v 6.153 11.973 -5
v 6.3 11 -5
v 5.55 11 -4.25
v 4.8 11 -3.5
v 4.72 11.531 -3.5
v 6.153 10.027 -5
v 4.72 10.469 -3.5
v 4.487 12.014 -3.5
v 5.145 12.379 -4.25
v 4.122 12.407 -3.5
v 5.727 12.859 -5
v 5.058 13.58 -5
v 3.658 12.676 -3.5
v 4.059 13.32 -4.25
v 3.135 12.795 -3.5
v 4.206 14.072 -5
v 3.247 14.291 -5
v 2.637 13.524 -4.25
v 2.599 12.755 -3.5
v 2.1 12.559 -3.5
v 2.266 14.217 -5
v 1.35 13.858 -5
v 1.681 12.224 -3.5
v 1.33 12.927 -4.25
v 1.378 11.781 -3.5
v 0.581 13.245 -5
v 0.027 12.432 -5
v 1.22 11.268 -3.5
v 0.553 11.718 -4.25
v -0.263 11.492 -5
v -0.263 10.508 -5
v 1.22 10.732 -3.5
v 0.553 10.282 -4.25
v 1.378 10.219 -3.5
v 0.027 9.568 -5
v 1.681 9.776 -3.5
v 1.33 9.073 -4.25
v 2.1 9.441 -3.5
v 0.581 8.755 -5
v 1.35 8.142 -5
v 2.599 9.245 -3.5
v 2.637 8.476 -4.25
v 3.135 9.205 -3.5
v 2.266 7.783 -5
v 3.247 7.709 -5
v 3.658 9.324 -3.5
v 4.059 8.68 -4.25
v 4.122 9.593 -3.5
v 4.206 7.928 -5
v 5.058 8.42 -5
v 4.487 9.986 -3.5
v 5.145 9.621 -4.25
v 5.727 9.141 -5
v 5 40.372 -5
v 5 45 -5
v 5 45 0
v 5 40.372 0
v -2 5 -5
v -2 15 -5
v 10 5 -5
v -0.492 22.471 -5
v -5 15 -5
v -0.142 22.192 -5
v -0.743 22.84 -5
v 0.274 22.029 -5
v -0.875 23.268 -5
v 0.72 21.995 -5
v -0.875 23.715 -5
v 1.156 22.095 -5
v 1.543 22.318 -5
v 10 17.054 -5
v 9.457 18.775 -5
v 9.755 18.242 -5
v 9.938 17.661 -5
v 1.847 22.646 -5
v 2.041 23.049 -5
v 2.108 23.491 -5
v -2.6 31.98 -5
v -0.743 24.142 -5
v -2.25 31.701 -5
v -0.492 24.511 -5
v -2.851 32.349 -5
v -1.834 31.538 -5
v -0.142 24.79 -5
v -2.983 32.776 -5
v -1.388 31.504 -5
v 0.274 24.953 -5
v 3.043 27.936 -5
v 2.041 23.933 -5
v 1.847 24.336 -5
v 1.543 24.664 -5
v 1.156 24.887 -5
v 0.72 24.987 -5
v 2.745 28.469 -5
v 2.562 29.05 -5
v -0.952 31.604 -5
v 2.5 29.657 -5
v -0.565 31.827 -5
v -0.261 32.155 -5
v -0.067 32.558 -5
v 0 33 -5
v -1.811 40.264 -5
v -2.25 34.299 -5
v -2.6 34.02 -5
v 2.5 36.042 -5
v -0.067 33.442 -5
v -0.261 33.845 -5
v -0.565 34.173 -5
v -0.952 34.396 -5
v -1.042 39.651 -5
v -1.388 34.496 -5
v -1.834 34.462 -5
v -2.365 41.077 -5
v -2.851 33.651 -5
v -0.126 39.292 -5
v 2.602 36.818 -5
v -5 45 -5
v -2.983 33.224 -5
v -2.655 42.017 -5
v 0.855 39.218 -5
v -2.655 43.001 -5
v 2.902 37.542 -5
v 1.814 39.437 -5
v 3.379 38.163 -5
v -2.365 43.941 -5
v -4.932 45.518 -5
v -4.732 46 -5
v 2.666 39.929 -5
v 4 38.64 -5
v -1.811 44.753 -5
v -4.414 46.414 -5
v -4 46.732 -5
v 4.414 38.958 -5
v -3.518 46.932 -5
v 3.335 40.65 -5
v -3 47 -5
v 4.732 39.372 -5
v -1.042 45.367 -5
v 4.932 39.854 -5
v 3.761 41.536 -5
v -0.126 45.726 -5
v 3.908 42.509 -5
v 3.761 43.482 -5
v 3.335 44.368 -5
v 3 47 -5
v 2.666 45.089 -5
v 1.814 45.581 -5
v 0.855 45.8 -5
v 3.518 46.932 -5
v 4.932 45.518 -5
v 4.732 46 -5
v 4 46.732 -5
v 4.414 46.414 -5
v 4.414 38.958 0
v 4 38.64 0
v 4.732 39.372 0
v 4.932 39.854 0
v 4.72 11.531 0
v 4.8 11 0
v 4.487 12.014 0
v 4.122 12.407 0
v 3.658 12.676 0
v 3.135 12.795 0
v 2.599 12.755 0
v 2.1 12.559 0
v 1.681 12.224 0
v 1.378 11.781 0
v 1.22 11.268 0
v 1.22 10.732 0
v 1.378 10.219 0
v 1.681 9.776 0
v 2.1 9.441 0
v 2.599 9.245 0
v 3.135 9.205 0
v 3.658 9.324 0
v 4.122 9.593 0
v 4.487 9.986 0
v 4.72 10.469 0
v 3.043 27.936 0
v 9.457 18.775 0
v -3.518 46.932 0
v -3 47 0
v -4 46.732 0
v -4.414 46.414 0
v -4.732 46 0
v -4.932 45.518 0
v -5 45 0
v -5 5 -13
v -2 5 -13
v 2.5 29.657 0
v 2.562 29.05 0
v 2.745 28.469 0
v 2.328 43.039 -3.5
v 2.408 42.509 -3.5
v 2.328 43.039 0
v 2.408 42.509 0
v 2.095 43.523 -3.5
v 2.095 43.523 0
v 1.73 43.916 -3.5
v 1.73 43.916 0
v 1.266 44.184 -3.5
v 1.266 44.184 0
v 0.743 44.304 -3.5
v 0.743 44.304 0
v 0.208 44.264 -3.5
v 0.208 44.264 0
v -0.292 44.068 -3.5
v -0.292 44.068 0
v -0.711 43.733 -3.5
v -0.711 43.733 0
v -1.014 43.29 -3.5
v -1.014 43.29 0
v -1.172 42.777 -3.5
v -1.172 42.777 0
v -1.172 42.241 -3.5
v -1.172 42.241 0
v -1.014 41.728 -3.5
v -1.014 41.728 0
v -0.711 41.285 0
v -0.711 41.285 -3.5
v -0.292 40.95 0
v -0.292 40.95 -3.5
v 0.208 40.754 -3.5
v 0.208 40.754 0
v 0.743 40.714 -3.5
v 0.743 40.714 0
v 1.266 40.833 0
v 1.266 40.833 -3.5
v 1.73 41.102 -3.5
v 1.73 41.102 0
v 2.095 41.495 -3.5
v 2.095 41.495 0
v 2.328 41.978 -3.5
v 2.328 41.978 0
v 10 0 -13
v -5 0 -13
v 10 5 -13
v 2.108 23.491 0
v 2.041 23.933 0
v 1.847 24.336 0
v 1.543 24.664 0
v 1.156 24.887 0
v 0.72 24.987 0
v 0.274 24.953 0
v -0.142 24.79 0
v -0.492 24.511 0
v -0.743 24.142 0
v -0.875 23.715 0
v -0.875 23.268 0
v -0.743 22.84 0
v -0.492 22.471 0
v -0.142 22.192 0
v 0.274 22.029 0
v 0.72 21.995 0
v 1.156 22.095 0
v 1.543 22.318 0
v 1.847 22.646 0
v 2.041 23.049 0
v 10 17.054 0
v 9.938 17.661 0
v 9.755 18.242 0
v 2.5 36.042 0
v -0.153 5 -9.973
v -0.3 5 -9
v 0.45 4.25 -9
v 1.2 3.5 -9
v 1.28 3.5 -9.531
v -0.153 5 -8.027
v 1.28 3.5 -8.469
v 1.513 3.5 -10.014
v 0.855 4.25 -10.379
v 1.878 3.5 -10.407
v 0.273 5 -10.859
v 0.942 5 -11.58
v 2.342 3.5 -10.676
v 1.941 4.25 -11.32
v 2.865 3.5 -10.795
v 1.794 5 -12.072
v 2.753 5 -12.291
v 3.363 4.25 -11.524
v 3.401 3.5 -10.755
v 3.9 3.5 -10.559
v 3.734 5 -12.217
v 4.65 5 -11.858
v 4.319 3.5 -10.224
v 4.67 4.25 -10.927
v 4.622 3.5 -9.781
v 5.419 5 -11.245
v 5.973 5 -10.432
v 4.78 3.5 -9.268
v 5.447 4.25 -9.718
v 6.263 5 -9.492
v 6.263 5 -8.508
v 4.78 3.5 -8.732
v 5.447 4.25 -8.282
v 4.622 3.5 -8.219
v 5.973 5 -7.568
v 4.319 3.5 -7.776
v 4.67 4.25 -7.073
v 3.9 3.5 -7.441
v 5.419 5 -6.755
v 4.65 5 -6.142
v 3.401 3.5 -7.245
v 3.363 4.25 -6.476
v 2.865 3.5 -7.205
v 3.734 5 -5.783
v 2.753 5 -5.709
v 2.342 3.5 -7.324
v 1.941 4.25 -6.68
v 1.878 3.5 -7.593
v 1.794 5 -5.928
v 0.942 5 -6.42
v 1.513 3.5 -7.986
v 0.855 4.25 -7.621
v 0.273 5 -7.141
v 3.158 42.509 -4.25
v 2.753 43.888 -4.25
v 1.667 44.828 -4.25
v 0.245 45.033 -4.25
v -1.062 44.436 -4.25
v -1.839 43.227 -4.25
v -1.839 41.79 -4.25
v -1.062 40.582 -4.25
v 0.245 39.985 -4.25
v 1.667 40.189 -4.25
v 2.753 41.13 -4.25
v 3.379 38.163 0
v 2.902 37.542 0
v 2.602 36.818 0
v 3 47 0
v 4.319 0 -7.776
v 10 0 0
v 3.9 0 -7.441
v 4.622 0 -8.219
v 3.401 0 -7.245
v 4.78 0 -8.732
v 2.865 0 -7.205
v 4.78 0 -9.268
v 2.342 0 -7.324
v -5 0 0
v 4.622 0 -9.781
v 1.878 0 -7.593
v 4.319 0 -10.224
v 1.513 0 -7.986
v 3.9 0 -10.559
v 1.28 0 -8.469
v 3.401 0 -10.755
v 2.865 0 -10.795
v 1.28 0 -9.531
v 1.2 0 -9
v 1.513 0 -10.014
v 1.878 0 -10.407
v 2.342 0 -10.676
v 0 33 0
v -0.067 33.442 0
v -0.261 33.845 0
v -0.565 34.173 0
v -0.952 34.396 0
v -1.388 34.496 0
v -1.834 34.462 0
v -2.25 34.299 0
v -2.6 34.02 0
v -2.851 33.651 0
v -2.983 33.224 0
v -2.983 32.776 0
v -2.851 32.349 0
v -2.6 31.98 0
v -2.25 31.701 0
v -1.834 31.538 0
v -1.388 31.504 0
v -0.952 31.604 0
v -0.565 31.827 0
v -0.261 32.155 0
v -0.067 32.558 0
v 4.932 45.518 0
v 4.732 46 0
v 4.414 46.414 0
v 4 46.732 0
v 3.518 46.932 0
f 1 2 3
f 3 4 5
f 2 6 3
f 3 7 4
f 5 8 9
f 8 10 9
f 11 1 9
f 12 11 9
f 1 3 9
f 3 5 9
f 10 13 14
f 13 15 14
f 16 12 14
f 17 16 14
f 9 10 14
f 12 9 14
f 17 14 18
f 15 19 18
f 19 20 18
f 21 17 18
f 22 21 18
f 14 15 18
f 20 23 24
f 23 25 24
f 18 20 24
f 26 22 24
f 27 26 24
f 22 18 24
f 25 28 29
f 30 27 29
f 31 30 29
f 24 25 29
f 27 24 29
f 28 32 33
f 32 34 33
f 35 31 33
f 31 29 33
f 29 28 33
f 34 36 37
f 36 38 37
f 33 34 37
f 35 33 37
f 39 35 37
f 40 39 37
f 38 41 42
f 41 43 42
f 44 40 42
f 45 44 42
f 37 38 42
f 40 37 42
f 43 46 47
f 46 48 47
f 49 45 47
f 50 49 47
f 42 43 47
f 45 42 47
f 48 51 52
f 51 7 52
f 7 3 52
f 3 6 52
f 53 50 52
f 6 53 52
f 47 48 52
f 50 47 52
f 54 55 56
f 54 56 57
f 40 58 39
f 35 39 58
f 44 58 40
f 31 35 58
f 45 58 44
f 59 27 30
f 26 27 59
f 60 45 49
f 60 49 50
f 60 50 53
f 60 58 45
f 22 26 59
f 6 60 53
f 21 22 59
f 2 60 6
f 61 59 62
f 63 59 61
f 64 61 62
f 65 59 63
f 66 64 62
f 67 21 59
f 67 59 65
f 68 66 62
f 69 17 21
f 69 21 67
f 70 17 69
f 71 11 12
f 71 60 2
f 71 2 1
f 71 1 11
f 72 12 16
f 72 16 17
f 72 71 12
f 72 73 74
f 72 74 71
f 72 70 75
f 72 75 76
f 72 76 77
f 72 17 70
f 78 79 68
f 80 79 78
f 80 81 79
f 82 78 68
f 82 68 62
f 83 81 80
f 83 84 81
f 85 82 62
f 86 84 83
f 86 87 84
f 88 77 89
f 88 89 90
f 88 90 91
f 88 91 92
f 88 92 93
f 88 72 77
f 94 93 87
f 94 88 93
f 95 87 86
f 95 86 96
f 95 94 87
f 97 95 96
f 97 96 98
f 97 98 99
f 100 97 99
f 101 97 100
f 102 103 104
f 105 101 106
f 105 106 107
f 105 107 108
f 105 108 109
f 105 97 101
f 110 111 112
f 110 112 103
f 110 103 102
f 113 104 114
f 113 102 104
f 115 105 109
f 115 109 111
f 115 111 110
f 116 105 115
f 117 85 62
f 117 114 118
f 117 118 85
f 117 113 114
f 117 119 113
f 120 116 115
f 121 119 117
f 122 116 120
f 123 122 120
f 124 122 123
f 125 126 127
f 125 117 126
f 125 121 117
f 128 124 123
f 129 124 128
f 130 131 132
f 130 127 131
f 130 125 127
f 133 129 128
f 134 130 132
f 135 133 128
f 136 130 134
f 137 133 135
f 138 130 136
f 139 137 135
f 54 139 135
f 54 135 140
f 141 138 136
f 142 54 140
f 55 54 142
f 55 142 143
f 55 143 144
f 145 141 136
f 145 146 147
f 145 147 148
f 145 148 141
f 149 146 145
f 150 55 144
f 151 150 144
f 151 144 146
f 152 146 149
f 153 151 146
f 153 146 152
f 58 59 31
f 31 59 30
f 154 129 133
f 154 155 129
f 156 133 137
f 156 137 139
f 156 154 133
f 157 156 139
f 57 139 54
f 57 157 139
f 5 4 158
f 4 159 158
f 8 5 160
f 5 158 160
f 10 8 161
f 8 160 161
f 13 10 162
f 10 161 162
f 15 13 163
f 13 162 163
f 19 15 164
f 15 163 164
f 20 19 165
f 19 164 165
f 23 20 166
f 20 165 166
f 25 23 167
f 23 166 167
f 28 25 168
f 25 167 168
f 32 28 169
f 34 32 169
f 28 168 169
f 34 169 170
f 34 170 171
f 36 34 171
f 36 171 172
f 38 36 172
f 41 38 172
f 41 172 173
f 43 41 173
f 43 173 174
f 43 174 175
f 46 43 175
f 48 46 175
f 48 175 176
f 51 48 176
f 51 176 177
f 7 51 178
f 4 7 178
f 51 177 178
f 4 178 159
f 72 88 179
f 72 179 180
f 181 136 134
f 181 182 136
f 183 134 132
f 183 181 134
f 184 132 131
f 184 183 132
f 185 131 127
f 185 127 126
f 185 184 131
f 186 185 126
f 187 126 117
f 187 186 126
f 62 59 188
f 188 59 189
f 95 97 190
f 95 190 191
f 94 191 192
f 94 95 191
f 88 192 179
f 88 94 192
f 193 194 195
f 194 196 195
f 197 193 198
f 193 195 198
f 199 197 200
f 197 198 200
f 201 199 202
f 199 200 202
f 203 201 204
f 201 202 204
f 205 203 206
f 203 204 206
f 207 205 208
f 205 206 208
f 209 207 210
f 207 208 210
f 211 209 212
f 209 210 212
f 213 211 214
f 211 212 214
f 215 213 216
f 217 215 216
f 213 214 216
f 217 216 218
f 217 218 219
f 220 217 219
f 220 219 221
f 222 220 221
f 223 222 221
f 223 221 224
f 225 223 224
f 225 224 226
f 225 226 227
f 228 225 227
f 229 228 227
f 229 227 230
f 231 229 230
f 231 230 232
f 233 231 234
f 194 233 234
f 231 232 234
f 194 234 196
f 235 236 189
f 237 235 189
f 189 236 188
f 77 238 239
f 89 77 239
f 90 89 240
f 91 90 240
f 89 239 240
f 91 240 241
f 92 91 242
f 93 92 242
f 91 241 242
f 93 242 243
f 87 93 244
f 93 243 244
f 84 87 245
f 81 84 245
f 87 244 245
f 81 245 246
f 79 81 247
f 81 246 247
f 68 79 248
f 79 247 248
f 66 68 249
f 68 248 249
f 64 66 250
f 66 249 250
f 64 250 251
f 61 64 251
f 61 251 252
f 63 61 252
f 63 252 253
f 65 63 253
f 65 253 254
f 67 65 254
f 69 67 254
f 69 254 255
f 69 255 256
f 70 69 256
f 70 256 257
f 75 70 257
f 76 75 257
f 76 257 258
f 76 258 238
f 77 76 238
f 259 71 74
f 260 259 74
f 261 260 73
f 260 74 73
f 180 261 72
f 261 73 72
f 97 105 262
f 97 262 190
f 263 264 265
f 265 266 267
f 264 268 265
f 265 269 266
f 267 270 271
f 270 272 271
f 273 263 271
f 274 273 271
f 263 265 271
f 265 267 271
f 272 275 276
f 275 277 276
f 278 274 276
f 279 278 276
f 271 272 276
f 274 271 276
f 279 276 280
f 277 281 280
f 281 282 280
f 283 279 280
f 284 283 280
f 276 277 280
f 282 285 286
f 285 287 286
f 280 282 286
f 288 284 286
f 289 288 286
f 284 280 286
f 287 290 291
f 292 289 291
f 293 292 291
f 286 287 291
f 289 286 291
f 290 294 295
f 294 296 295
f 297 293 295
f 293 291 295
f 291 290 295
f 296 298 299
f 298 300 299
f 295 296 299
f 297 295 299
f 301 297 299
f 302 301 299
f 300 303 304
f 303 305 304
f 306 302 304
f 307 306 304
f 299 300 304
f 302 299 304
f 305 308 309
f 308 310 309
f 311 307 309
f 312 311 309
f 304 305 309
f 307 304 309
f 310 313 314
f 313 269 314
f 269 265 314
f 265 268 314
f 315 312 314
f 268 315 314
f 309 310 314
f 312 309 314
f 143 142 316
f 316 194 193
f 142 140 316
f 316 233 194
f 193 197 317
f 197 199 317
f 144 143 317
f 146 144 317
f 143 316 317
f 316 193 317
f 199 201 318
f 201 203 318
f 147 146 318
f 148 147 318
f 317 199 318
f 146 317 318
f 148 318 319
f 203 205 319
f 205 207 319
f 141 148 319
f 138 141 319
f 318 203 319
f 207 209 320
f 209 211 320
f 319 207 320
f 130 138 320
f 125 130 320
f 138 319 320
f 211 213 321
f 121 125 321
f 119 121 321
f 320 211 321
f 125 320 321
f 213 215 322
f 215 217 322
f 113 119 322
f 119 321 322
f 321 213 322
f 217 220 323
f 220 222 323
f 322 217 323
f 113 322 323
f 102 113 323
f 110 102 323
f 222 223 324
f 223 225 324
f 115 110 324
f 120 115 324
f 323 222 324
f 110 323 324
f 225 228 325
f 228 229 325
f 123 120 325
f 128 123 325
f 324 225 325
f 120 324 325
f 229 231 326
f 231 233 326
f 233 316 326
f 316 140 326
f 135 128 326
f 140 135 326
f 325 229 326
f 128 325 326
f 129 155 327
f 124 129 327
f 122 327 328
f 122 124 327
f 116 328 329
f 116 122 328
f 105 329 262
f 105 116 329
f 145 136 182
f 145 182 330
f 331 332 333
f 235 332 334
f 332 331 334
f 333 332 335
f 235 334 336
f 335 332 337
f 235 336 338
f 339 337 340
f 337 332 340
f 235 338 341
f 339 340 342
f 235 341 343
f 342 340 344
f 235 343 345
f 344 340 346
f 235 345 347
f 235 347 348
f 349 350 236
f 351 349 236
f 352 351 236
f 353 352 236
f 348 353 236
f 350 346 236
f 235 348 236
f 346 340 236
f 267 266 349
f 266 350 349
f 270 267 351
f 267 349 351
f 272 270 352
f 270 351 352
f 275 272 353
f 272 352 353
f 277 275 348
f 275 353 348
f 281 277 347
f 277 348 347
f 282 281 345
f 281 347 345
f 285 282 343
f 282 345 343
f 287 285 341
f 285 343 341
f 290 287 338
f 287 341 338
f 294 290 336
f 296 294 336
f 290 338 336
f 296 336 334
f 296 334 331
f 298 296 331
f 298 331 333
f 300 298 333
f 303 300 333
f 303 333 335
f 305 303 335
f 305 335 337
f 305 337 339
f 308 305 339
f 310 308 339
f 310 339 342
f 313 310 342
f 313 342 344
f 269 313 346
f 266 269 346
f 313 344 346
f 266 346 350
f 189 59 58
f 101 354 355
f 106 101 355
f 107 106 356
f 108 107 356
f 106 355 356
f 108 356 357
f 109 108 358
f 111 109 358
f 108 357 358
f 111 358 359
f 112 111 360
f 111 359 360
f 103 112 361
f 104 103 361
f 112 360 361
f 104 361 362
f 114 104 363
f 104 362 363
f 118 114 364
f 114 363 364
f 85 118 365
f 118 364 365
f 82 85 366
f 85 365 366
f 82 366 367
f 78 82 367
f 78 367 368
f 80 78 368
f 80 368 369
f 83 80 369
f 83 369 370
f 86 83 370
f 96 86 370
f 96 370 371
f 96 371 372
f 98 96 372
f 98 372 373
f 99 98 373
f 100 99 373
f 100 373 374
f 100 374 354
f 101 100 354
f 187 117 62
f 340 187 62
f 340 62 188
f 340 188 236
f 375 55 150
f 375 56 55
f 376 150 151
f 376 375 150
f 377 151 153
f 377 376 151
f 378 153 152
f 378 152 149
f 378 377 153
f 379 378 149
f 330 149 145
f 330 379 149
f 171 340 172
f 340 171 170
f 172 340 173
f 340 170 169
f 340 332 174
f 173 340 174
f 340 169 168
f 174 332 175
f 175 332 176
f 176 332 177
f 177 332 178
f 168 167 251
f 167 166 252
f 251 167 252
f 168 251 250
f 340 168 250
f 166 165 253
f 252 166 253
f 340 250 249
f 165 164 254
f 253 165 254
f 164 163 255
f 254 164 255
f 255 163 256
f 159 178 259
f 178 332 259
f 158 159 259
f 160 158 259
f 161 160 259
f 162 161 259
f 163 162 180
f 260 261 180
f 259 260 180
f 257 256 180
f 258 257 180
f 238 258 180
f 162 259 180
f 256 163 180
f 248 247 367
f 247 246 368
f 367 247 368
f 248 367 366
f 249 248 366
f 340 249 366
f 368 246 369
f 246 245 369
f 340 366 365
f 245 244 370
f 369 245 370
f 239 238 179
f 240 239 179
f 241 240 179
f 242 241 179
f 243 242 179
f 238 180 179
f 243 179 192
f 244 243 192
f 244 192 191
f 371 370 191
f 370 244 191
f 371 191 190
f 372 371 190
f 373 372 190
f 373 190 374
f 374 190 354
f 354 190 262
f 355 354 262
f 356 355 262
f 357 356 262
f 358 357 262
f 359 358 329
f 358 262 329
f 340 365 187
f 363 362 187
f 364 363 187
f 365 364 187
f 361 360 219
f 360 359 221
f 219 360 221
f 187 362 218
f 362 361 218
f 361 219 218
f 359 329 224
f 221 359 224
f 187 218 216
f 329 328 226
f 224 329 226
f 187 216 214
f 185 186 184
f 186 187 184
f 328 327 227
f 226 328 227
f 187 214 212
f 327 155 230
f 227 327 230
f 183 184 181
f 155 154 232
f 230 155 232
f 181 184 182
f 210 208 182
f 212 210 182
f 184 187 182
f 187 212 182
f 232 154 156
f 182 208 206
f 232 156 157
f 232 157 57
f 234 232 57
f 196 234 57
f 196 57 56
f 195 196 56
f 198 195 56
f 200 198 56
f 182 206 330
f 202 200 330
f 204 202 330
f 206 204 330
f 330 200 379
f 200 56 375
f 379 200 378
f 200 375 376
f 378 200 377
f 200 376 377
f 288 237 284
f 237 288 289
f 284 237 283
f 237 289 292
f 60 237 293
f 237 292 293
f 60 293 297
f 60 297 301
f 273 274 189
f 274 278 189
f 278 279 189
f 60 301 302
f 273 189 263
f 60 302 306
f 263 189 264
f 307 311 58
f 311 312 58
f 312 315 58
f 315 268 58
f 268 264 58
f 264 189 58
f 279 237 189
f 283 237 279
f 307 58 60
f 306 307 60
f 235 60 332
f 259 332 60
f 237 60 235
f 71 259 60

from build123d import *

# Parameters (mm, degrees)
EXTRUDE_1_DEPTH           = 10
EXTRUDE_1_DEPTH_BACK      = 5
EXTRUDE_2_DEPTH           = 5
RIB_4_REACH               = 54.517
SKETCH_2_WALL_W           = 119.839576518
SKETCH_2_WALL_H           = 3
HOLE_WIZARD_1_D           = 3.6
HOLE_WIZARD_1_CSINK_D     = 6.6
HOLE_WIZARD_1_CSINK_ANGLE = 90
MM_TRANSITIONAL_1_D       = 3
FILLET_1_R                = 3
FILLET_2_R                = 2
HOLE_WIZARD_2_D           = 3.6
HOLE_WIZARD_2_CSINK_D     = 6.6
HOLE_WIZARD_2_CSINK_ANGLE = 90


with BuildPart() as part:
    # 草图1 → 凸台-拉伸1 (new, two sides: drawn at the far end of the back side and taken through both)
    with BuildSketch(Plane(origin=(0, 0, 0), x_dir=(0, 0, -1), z_dir=(1, 0, 0)).offset(-EXTRUDE_1_DEPTH_BACK)):
        Polygon((13, 5), (5, 5), (5, 18), (0, 18), (0, 0), (13, 0), align=None)
    extrude(amount=EXTRUDE_1_DEPTH + EXTRUDE_1_DEPTH_BACK)

    # 草图3 → 凸台-拉伸2 (add)
    with BuildSketch(Plane(origin=(-10, 0, -5), x_dir=(-1, 0, 0), z_dir=(0, 0, -1))):
        Polygon((-5, 18), (-5, 47), (-15, 47), (-15, 39), (-12.5, 39), (-12.5, 28.711110051), (-20, 18), align=None)
    extrude(amount=-EXTRUDE_2_DEPTH)

    # 草图2 wall → 筋4 (add, up to next)
    with BuildSketch(Plane(origin=(-5, 10, -9), x_dir=(0, -0.780868809443, -0.624695047554), z_dir=(0, -0.624695047554, 0.780868809443)), mode=Mode.PRIVATE) as rib_4_sk1:
        with Locations((0, 1.5)):
            Rectangle(SKETCH_2_WALL_W, SKETCH_2_WALL_H)
    rib_4_tool1 = extrude(rib_4_sk1.sketch, amount=RIB_4_REACH, mode=Mode.PRIVATE) - part.part
    add(rib_4_tool1.solids().sort_by_distance((-5, 10, -9))[0])

    # 打孔尺寸(%根据十字)槽半沉头木螺钉的类型1 (through all)
    with Locations(Plane(origin=(0, 0, -5), x_dir=(-1, 0, 0), z_dir=(0, 0, -1))):
        with Locations((-3, 11), (-0.608074792, 42.508910889)):
            CounterSinkHole(HOLE_WIZARD_1_D / 2, HOLE_WIZARD_1_CSINK_D / 2, counter_sink_angle=HOLE_WIZARD_1_CSINK_ANGLE)

    # 大小mm Transitional 暗销孔1 (through all)
    with Locations(Plane(origin=(0, 0, -5), x_dir=(-1, 0, 0), z_dir=(0, 0, -1))):
        with Locations((1.5, 33), (-0.608074792, 23.491089111)):
            Hole(MM_TRANSITIONAL_1_D / 2)

    # 圆角1
    # the kernel refuses this fillet: 3 mm, written as the material it adds along each edge
    with BuildSketch(Plane(origin=(2.5, 28.711110051, -5), x_dir=(0.5735764363510514, -0.8191520442889881, 0), z_dir=(0, 0, 1))) as fillet_1_piece_1:
        with BuildLine():
            CenterArc((FILLET_1_R * 0.315298788879, FILLET_1_R), FILLET_1_R, 235, 35)
            Line((-FILLET_1_R * 0.258277647472, FILLET_1_R * 0.180847955711), (0, 0))
            Line((0, 0), (FILLET_1_R * 0.315298788879, 0))
        make_face()
    extrude(amount=5)
    with BuildSketch(Plane(origin=(2.5, 39, -5), x_dir=(0, -1, 0), z_dir=(0, 0, 1))) as fillet_1_piece_2:
        with BuildLine():
            CenterArc((2.958039892, 3), FILLET_1_R, 189.594068227, 80.405931773)
            Line((0, 2.5), (0, 0))
            Line((0, 0), (2.958039892, 0))
        make_face()
    extrude(amount=5)
    # the kernel refuses this fillet: 3 mm, written as the material it takes off along each edge
    with BuildSketch(Plane(origin=(10, 18, -7.364740917), x_dir=(0, -1, 0), z_dir=(0, 0, 1))) as fillet_1_2_piece_1:
        with BuildLine():
            CenterArc((FILLET_1_R * 0.315298788879, -FILLET_1_R), FILLET_1_R, 90, 35)
            Line((-FILLET_1_R * 0.258277647472, -FILLET_1_R * 0.180847955711), (0, 0))
            Line((0, 0), (FILLET_1_R * 0.315298788879, 0))
        make_face()
    extrude(amount=9.729481833, mode=Mode.SUBTRACT)

    # 圆角2
    fillet_2_edges = [part.edges().sort_by_distance(p)[0] for p in [
        (-5, 47, -2.5),
        (5, 47, -2.5),
        (5, 39, -2.5),
    ]]
    fillet(fillet_2_edges, radius=FILLET_2_R)

    # 打孔尺寸(%根据十字)槽半沉头木螺钉的类型2 (through all)
    with Locations(Plane(origin=(0, 5, 0), x_dir=(1, 0, 0), z_dir=(0, 1, 0))):
        with Locations((3, 9)):
            CounterSinkHole(HOLE_WIZARD_2_D / 2, HOLE_WIZARD_2_CSINK_D / 2, counter_sink_angle=HOLE_WIZARD_2_CSINK_ANGLE)


solid = part.part
